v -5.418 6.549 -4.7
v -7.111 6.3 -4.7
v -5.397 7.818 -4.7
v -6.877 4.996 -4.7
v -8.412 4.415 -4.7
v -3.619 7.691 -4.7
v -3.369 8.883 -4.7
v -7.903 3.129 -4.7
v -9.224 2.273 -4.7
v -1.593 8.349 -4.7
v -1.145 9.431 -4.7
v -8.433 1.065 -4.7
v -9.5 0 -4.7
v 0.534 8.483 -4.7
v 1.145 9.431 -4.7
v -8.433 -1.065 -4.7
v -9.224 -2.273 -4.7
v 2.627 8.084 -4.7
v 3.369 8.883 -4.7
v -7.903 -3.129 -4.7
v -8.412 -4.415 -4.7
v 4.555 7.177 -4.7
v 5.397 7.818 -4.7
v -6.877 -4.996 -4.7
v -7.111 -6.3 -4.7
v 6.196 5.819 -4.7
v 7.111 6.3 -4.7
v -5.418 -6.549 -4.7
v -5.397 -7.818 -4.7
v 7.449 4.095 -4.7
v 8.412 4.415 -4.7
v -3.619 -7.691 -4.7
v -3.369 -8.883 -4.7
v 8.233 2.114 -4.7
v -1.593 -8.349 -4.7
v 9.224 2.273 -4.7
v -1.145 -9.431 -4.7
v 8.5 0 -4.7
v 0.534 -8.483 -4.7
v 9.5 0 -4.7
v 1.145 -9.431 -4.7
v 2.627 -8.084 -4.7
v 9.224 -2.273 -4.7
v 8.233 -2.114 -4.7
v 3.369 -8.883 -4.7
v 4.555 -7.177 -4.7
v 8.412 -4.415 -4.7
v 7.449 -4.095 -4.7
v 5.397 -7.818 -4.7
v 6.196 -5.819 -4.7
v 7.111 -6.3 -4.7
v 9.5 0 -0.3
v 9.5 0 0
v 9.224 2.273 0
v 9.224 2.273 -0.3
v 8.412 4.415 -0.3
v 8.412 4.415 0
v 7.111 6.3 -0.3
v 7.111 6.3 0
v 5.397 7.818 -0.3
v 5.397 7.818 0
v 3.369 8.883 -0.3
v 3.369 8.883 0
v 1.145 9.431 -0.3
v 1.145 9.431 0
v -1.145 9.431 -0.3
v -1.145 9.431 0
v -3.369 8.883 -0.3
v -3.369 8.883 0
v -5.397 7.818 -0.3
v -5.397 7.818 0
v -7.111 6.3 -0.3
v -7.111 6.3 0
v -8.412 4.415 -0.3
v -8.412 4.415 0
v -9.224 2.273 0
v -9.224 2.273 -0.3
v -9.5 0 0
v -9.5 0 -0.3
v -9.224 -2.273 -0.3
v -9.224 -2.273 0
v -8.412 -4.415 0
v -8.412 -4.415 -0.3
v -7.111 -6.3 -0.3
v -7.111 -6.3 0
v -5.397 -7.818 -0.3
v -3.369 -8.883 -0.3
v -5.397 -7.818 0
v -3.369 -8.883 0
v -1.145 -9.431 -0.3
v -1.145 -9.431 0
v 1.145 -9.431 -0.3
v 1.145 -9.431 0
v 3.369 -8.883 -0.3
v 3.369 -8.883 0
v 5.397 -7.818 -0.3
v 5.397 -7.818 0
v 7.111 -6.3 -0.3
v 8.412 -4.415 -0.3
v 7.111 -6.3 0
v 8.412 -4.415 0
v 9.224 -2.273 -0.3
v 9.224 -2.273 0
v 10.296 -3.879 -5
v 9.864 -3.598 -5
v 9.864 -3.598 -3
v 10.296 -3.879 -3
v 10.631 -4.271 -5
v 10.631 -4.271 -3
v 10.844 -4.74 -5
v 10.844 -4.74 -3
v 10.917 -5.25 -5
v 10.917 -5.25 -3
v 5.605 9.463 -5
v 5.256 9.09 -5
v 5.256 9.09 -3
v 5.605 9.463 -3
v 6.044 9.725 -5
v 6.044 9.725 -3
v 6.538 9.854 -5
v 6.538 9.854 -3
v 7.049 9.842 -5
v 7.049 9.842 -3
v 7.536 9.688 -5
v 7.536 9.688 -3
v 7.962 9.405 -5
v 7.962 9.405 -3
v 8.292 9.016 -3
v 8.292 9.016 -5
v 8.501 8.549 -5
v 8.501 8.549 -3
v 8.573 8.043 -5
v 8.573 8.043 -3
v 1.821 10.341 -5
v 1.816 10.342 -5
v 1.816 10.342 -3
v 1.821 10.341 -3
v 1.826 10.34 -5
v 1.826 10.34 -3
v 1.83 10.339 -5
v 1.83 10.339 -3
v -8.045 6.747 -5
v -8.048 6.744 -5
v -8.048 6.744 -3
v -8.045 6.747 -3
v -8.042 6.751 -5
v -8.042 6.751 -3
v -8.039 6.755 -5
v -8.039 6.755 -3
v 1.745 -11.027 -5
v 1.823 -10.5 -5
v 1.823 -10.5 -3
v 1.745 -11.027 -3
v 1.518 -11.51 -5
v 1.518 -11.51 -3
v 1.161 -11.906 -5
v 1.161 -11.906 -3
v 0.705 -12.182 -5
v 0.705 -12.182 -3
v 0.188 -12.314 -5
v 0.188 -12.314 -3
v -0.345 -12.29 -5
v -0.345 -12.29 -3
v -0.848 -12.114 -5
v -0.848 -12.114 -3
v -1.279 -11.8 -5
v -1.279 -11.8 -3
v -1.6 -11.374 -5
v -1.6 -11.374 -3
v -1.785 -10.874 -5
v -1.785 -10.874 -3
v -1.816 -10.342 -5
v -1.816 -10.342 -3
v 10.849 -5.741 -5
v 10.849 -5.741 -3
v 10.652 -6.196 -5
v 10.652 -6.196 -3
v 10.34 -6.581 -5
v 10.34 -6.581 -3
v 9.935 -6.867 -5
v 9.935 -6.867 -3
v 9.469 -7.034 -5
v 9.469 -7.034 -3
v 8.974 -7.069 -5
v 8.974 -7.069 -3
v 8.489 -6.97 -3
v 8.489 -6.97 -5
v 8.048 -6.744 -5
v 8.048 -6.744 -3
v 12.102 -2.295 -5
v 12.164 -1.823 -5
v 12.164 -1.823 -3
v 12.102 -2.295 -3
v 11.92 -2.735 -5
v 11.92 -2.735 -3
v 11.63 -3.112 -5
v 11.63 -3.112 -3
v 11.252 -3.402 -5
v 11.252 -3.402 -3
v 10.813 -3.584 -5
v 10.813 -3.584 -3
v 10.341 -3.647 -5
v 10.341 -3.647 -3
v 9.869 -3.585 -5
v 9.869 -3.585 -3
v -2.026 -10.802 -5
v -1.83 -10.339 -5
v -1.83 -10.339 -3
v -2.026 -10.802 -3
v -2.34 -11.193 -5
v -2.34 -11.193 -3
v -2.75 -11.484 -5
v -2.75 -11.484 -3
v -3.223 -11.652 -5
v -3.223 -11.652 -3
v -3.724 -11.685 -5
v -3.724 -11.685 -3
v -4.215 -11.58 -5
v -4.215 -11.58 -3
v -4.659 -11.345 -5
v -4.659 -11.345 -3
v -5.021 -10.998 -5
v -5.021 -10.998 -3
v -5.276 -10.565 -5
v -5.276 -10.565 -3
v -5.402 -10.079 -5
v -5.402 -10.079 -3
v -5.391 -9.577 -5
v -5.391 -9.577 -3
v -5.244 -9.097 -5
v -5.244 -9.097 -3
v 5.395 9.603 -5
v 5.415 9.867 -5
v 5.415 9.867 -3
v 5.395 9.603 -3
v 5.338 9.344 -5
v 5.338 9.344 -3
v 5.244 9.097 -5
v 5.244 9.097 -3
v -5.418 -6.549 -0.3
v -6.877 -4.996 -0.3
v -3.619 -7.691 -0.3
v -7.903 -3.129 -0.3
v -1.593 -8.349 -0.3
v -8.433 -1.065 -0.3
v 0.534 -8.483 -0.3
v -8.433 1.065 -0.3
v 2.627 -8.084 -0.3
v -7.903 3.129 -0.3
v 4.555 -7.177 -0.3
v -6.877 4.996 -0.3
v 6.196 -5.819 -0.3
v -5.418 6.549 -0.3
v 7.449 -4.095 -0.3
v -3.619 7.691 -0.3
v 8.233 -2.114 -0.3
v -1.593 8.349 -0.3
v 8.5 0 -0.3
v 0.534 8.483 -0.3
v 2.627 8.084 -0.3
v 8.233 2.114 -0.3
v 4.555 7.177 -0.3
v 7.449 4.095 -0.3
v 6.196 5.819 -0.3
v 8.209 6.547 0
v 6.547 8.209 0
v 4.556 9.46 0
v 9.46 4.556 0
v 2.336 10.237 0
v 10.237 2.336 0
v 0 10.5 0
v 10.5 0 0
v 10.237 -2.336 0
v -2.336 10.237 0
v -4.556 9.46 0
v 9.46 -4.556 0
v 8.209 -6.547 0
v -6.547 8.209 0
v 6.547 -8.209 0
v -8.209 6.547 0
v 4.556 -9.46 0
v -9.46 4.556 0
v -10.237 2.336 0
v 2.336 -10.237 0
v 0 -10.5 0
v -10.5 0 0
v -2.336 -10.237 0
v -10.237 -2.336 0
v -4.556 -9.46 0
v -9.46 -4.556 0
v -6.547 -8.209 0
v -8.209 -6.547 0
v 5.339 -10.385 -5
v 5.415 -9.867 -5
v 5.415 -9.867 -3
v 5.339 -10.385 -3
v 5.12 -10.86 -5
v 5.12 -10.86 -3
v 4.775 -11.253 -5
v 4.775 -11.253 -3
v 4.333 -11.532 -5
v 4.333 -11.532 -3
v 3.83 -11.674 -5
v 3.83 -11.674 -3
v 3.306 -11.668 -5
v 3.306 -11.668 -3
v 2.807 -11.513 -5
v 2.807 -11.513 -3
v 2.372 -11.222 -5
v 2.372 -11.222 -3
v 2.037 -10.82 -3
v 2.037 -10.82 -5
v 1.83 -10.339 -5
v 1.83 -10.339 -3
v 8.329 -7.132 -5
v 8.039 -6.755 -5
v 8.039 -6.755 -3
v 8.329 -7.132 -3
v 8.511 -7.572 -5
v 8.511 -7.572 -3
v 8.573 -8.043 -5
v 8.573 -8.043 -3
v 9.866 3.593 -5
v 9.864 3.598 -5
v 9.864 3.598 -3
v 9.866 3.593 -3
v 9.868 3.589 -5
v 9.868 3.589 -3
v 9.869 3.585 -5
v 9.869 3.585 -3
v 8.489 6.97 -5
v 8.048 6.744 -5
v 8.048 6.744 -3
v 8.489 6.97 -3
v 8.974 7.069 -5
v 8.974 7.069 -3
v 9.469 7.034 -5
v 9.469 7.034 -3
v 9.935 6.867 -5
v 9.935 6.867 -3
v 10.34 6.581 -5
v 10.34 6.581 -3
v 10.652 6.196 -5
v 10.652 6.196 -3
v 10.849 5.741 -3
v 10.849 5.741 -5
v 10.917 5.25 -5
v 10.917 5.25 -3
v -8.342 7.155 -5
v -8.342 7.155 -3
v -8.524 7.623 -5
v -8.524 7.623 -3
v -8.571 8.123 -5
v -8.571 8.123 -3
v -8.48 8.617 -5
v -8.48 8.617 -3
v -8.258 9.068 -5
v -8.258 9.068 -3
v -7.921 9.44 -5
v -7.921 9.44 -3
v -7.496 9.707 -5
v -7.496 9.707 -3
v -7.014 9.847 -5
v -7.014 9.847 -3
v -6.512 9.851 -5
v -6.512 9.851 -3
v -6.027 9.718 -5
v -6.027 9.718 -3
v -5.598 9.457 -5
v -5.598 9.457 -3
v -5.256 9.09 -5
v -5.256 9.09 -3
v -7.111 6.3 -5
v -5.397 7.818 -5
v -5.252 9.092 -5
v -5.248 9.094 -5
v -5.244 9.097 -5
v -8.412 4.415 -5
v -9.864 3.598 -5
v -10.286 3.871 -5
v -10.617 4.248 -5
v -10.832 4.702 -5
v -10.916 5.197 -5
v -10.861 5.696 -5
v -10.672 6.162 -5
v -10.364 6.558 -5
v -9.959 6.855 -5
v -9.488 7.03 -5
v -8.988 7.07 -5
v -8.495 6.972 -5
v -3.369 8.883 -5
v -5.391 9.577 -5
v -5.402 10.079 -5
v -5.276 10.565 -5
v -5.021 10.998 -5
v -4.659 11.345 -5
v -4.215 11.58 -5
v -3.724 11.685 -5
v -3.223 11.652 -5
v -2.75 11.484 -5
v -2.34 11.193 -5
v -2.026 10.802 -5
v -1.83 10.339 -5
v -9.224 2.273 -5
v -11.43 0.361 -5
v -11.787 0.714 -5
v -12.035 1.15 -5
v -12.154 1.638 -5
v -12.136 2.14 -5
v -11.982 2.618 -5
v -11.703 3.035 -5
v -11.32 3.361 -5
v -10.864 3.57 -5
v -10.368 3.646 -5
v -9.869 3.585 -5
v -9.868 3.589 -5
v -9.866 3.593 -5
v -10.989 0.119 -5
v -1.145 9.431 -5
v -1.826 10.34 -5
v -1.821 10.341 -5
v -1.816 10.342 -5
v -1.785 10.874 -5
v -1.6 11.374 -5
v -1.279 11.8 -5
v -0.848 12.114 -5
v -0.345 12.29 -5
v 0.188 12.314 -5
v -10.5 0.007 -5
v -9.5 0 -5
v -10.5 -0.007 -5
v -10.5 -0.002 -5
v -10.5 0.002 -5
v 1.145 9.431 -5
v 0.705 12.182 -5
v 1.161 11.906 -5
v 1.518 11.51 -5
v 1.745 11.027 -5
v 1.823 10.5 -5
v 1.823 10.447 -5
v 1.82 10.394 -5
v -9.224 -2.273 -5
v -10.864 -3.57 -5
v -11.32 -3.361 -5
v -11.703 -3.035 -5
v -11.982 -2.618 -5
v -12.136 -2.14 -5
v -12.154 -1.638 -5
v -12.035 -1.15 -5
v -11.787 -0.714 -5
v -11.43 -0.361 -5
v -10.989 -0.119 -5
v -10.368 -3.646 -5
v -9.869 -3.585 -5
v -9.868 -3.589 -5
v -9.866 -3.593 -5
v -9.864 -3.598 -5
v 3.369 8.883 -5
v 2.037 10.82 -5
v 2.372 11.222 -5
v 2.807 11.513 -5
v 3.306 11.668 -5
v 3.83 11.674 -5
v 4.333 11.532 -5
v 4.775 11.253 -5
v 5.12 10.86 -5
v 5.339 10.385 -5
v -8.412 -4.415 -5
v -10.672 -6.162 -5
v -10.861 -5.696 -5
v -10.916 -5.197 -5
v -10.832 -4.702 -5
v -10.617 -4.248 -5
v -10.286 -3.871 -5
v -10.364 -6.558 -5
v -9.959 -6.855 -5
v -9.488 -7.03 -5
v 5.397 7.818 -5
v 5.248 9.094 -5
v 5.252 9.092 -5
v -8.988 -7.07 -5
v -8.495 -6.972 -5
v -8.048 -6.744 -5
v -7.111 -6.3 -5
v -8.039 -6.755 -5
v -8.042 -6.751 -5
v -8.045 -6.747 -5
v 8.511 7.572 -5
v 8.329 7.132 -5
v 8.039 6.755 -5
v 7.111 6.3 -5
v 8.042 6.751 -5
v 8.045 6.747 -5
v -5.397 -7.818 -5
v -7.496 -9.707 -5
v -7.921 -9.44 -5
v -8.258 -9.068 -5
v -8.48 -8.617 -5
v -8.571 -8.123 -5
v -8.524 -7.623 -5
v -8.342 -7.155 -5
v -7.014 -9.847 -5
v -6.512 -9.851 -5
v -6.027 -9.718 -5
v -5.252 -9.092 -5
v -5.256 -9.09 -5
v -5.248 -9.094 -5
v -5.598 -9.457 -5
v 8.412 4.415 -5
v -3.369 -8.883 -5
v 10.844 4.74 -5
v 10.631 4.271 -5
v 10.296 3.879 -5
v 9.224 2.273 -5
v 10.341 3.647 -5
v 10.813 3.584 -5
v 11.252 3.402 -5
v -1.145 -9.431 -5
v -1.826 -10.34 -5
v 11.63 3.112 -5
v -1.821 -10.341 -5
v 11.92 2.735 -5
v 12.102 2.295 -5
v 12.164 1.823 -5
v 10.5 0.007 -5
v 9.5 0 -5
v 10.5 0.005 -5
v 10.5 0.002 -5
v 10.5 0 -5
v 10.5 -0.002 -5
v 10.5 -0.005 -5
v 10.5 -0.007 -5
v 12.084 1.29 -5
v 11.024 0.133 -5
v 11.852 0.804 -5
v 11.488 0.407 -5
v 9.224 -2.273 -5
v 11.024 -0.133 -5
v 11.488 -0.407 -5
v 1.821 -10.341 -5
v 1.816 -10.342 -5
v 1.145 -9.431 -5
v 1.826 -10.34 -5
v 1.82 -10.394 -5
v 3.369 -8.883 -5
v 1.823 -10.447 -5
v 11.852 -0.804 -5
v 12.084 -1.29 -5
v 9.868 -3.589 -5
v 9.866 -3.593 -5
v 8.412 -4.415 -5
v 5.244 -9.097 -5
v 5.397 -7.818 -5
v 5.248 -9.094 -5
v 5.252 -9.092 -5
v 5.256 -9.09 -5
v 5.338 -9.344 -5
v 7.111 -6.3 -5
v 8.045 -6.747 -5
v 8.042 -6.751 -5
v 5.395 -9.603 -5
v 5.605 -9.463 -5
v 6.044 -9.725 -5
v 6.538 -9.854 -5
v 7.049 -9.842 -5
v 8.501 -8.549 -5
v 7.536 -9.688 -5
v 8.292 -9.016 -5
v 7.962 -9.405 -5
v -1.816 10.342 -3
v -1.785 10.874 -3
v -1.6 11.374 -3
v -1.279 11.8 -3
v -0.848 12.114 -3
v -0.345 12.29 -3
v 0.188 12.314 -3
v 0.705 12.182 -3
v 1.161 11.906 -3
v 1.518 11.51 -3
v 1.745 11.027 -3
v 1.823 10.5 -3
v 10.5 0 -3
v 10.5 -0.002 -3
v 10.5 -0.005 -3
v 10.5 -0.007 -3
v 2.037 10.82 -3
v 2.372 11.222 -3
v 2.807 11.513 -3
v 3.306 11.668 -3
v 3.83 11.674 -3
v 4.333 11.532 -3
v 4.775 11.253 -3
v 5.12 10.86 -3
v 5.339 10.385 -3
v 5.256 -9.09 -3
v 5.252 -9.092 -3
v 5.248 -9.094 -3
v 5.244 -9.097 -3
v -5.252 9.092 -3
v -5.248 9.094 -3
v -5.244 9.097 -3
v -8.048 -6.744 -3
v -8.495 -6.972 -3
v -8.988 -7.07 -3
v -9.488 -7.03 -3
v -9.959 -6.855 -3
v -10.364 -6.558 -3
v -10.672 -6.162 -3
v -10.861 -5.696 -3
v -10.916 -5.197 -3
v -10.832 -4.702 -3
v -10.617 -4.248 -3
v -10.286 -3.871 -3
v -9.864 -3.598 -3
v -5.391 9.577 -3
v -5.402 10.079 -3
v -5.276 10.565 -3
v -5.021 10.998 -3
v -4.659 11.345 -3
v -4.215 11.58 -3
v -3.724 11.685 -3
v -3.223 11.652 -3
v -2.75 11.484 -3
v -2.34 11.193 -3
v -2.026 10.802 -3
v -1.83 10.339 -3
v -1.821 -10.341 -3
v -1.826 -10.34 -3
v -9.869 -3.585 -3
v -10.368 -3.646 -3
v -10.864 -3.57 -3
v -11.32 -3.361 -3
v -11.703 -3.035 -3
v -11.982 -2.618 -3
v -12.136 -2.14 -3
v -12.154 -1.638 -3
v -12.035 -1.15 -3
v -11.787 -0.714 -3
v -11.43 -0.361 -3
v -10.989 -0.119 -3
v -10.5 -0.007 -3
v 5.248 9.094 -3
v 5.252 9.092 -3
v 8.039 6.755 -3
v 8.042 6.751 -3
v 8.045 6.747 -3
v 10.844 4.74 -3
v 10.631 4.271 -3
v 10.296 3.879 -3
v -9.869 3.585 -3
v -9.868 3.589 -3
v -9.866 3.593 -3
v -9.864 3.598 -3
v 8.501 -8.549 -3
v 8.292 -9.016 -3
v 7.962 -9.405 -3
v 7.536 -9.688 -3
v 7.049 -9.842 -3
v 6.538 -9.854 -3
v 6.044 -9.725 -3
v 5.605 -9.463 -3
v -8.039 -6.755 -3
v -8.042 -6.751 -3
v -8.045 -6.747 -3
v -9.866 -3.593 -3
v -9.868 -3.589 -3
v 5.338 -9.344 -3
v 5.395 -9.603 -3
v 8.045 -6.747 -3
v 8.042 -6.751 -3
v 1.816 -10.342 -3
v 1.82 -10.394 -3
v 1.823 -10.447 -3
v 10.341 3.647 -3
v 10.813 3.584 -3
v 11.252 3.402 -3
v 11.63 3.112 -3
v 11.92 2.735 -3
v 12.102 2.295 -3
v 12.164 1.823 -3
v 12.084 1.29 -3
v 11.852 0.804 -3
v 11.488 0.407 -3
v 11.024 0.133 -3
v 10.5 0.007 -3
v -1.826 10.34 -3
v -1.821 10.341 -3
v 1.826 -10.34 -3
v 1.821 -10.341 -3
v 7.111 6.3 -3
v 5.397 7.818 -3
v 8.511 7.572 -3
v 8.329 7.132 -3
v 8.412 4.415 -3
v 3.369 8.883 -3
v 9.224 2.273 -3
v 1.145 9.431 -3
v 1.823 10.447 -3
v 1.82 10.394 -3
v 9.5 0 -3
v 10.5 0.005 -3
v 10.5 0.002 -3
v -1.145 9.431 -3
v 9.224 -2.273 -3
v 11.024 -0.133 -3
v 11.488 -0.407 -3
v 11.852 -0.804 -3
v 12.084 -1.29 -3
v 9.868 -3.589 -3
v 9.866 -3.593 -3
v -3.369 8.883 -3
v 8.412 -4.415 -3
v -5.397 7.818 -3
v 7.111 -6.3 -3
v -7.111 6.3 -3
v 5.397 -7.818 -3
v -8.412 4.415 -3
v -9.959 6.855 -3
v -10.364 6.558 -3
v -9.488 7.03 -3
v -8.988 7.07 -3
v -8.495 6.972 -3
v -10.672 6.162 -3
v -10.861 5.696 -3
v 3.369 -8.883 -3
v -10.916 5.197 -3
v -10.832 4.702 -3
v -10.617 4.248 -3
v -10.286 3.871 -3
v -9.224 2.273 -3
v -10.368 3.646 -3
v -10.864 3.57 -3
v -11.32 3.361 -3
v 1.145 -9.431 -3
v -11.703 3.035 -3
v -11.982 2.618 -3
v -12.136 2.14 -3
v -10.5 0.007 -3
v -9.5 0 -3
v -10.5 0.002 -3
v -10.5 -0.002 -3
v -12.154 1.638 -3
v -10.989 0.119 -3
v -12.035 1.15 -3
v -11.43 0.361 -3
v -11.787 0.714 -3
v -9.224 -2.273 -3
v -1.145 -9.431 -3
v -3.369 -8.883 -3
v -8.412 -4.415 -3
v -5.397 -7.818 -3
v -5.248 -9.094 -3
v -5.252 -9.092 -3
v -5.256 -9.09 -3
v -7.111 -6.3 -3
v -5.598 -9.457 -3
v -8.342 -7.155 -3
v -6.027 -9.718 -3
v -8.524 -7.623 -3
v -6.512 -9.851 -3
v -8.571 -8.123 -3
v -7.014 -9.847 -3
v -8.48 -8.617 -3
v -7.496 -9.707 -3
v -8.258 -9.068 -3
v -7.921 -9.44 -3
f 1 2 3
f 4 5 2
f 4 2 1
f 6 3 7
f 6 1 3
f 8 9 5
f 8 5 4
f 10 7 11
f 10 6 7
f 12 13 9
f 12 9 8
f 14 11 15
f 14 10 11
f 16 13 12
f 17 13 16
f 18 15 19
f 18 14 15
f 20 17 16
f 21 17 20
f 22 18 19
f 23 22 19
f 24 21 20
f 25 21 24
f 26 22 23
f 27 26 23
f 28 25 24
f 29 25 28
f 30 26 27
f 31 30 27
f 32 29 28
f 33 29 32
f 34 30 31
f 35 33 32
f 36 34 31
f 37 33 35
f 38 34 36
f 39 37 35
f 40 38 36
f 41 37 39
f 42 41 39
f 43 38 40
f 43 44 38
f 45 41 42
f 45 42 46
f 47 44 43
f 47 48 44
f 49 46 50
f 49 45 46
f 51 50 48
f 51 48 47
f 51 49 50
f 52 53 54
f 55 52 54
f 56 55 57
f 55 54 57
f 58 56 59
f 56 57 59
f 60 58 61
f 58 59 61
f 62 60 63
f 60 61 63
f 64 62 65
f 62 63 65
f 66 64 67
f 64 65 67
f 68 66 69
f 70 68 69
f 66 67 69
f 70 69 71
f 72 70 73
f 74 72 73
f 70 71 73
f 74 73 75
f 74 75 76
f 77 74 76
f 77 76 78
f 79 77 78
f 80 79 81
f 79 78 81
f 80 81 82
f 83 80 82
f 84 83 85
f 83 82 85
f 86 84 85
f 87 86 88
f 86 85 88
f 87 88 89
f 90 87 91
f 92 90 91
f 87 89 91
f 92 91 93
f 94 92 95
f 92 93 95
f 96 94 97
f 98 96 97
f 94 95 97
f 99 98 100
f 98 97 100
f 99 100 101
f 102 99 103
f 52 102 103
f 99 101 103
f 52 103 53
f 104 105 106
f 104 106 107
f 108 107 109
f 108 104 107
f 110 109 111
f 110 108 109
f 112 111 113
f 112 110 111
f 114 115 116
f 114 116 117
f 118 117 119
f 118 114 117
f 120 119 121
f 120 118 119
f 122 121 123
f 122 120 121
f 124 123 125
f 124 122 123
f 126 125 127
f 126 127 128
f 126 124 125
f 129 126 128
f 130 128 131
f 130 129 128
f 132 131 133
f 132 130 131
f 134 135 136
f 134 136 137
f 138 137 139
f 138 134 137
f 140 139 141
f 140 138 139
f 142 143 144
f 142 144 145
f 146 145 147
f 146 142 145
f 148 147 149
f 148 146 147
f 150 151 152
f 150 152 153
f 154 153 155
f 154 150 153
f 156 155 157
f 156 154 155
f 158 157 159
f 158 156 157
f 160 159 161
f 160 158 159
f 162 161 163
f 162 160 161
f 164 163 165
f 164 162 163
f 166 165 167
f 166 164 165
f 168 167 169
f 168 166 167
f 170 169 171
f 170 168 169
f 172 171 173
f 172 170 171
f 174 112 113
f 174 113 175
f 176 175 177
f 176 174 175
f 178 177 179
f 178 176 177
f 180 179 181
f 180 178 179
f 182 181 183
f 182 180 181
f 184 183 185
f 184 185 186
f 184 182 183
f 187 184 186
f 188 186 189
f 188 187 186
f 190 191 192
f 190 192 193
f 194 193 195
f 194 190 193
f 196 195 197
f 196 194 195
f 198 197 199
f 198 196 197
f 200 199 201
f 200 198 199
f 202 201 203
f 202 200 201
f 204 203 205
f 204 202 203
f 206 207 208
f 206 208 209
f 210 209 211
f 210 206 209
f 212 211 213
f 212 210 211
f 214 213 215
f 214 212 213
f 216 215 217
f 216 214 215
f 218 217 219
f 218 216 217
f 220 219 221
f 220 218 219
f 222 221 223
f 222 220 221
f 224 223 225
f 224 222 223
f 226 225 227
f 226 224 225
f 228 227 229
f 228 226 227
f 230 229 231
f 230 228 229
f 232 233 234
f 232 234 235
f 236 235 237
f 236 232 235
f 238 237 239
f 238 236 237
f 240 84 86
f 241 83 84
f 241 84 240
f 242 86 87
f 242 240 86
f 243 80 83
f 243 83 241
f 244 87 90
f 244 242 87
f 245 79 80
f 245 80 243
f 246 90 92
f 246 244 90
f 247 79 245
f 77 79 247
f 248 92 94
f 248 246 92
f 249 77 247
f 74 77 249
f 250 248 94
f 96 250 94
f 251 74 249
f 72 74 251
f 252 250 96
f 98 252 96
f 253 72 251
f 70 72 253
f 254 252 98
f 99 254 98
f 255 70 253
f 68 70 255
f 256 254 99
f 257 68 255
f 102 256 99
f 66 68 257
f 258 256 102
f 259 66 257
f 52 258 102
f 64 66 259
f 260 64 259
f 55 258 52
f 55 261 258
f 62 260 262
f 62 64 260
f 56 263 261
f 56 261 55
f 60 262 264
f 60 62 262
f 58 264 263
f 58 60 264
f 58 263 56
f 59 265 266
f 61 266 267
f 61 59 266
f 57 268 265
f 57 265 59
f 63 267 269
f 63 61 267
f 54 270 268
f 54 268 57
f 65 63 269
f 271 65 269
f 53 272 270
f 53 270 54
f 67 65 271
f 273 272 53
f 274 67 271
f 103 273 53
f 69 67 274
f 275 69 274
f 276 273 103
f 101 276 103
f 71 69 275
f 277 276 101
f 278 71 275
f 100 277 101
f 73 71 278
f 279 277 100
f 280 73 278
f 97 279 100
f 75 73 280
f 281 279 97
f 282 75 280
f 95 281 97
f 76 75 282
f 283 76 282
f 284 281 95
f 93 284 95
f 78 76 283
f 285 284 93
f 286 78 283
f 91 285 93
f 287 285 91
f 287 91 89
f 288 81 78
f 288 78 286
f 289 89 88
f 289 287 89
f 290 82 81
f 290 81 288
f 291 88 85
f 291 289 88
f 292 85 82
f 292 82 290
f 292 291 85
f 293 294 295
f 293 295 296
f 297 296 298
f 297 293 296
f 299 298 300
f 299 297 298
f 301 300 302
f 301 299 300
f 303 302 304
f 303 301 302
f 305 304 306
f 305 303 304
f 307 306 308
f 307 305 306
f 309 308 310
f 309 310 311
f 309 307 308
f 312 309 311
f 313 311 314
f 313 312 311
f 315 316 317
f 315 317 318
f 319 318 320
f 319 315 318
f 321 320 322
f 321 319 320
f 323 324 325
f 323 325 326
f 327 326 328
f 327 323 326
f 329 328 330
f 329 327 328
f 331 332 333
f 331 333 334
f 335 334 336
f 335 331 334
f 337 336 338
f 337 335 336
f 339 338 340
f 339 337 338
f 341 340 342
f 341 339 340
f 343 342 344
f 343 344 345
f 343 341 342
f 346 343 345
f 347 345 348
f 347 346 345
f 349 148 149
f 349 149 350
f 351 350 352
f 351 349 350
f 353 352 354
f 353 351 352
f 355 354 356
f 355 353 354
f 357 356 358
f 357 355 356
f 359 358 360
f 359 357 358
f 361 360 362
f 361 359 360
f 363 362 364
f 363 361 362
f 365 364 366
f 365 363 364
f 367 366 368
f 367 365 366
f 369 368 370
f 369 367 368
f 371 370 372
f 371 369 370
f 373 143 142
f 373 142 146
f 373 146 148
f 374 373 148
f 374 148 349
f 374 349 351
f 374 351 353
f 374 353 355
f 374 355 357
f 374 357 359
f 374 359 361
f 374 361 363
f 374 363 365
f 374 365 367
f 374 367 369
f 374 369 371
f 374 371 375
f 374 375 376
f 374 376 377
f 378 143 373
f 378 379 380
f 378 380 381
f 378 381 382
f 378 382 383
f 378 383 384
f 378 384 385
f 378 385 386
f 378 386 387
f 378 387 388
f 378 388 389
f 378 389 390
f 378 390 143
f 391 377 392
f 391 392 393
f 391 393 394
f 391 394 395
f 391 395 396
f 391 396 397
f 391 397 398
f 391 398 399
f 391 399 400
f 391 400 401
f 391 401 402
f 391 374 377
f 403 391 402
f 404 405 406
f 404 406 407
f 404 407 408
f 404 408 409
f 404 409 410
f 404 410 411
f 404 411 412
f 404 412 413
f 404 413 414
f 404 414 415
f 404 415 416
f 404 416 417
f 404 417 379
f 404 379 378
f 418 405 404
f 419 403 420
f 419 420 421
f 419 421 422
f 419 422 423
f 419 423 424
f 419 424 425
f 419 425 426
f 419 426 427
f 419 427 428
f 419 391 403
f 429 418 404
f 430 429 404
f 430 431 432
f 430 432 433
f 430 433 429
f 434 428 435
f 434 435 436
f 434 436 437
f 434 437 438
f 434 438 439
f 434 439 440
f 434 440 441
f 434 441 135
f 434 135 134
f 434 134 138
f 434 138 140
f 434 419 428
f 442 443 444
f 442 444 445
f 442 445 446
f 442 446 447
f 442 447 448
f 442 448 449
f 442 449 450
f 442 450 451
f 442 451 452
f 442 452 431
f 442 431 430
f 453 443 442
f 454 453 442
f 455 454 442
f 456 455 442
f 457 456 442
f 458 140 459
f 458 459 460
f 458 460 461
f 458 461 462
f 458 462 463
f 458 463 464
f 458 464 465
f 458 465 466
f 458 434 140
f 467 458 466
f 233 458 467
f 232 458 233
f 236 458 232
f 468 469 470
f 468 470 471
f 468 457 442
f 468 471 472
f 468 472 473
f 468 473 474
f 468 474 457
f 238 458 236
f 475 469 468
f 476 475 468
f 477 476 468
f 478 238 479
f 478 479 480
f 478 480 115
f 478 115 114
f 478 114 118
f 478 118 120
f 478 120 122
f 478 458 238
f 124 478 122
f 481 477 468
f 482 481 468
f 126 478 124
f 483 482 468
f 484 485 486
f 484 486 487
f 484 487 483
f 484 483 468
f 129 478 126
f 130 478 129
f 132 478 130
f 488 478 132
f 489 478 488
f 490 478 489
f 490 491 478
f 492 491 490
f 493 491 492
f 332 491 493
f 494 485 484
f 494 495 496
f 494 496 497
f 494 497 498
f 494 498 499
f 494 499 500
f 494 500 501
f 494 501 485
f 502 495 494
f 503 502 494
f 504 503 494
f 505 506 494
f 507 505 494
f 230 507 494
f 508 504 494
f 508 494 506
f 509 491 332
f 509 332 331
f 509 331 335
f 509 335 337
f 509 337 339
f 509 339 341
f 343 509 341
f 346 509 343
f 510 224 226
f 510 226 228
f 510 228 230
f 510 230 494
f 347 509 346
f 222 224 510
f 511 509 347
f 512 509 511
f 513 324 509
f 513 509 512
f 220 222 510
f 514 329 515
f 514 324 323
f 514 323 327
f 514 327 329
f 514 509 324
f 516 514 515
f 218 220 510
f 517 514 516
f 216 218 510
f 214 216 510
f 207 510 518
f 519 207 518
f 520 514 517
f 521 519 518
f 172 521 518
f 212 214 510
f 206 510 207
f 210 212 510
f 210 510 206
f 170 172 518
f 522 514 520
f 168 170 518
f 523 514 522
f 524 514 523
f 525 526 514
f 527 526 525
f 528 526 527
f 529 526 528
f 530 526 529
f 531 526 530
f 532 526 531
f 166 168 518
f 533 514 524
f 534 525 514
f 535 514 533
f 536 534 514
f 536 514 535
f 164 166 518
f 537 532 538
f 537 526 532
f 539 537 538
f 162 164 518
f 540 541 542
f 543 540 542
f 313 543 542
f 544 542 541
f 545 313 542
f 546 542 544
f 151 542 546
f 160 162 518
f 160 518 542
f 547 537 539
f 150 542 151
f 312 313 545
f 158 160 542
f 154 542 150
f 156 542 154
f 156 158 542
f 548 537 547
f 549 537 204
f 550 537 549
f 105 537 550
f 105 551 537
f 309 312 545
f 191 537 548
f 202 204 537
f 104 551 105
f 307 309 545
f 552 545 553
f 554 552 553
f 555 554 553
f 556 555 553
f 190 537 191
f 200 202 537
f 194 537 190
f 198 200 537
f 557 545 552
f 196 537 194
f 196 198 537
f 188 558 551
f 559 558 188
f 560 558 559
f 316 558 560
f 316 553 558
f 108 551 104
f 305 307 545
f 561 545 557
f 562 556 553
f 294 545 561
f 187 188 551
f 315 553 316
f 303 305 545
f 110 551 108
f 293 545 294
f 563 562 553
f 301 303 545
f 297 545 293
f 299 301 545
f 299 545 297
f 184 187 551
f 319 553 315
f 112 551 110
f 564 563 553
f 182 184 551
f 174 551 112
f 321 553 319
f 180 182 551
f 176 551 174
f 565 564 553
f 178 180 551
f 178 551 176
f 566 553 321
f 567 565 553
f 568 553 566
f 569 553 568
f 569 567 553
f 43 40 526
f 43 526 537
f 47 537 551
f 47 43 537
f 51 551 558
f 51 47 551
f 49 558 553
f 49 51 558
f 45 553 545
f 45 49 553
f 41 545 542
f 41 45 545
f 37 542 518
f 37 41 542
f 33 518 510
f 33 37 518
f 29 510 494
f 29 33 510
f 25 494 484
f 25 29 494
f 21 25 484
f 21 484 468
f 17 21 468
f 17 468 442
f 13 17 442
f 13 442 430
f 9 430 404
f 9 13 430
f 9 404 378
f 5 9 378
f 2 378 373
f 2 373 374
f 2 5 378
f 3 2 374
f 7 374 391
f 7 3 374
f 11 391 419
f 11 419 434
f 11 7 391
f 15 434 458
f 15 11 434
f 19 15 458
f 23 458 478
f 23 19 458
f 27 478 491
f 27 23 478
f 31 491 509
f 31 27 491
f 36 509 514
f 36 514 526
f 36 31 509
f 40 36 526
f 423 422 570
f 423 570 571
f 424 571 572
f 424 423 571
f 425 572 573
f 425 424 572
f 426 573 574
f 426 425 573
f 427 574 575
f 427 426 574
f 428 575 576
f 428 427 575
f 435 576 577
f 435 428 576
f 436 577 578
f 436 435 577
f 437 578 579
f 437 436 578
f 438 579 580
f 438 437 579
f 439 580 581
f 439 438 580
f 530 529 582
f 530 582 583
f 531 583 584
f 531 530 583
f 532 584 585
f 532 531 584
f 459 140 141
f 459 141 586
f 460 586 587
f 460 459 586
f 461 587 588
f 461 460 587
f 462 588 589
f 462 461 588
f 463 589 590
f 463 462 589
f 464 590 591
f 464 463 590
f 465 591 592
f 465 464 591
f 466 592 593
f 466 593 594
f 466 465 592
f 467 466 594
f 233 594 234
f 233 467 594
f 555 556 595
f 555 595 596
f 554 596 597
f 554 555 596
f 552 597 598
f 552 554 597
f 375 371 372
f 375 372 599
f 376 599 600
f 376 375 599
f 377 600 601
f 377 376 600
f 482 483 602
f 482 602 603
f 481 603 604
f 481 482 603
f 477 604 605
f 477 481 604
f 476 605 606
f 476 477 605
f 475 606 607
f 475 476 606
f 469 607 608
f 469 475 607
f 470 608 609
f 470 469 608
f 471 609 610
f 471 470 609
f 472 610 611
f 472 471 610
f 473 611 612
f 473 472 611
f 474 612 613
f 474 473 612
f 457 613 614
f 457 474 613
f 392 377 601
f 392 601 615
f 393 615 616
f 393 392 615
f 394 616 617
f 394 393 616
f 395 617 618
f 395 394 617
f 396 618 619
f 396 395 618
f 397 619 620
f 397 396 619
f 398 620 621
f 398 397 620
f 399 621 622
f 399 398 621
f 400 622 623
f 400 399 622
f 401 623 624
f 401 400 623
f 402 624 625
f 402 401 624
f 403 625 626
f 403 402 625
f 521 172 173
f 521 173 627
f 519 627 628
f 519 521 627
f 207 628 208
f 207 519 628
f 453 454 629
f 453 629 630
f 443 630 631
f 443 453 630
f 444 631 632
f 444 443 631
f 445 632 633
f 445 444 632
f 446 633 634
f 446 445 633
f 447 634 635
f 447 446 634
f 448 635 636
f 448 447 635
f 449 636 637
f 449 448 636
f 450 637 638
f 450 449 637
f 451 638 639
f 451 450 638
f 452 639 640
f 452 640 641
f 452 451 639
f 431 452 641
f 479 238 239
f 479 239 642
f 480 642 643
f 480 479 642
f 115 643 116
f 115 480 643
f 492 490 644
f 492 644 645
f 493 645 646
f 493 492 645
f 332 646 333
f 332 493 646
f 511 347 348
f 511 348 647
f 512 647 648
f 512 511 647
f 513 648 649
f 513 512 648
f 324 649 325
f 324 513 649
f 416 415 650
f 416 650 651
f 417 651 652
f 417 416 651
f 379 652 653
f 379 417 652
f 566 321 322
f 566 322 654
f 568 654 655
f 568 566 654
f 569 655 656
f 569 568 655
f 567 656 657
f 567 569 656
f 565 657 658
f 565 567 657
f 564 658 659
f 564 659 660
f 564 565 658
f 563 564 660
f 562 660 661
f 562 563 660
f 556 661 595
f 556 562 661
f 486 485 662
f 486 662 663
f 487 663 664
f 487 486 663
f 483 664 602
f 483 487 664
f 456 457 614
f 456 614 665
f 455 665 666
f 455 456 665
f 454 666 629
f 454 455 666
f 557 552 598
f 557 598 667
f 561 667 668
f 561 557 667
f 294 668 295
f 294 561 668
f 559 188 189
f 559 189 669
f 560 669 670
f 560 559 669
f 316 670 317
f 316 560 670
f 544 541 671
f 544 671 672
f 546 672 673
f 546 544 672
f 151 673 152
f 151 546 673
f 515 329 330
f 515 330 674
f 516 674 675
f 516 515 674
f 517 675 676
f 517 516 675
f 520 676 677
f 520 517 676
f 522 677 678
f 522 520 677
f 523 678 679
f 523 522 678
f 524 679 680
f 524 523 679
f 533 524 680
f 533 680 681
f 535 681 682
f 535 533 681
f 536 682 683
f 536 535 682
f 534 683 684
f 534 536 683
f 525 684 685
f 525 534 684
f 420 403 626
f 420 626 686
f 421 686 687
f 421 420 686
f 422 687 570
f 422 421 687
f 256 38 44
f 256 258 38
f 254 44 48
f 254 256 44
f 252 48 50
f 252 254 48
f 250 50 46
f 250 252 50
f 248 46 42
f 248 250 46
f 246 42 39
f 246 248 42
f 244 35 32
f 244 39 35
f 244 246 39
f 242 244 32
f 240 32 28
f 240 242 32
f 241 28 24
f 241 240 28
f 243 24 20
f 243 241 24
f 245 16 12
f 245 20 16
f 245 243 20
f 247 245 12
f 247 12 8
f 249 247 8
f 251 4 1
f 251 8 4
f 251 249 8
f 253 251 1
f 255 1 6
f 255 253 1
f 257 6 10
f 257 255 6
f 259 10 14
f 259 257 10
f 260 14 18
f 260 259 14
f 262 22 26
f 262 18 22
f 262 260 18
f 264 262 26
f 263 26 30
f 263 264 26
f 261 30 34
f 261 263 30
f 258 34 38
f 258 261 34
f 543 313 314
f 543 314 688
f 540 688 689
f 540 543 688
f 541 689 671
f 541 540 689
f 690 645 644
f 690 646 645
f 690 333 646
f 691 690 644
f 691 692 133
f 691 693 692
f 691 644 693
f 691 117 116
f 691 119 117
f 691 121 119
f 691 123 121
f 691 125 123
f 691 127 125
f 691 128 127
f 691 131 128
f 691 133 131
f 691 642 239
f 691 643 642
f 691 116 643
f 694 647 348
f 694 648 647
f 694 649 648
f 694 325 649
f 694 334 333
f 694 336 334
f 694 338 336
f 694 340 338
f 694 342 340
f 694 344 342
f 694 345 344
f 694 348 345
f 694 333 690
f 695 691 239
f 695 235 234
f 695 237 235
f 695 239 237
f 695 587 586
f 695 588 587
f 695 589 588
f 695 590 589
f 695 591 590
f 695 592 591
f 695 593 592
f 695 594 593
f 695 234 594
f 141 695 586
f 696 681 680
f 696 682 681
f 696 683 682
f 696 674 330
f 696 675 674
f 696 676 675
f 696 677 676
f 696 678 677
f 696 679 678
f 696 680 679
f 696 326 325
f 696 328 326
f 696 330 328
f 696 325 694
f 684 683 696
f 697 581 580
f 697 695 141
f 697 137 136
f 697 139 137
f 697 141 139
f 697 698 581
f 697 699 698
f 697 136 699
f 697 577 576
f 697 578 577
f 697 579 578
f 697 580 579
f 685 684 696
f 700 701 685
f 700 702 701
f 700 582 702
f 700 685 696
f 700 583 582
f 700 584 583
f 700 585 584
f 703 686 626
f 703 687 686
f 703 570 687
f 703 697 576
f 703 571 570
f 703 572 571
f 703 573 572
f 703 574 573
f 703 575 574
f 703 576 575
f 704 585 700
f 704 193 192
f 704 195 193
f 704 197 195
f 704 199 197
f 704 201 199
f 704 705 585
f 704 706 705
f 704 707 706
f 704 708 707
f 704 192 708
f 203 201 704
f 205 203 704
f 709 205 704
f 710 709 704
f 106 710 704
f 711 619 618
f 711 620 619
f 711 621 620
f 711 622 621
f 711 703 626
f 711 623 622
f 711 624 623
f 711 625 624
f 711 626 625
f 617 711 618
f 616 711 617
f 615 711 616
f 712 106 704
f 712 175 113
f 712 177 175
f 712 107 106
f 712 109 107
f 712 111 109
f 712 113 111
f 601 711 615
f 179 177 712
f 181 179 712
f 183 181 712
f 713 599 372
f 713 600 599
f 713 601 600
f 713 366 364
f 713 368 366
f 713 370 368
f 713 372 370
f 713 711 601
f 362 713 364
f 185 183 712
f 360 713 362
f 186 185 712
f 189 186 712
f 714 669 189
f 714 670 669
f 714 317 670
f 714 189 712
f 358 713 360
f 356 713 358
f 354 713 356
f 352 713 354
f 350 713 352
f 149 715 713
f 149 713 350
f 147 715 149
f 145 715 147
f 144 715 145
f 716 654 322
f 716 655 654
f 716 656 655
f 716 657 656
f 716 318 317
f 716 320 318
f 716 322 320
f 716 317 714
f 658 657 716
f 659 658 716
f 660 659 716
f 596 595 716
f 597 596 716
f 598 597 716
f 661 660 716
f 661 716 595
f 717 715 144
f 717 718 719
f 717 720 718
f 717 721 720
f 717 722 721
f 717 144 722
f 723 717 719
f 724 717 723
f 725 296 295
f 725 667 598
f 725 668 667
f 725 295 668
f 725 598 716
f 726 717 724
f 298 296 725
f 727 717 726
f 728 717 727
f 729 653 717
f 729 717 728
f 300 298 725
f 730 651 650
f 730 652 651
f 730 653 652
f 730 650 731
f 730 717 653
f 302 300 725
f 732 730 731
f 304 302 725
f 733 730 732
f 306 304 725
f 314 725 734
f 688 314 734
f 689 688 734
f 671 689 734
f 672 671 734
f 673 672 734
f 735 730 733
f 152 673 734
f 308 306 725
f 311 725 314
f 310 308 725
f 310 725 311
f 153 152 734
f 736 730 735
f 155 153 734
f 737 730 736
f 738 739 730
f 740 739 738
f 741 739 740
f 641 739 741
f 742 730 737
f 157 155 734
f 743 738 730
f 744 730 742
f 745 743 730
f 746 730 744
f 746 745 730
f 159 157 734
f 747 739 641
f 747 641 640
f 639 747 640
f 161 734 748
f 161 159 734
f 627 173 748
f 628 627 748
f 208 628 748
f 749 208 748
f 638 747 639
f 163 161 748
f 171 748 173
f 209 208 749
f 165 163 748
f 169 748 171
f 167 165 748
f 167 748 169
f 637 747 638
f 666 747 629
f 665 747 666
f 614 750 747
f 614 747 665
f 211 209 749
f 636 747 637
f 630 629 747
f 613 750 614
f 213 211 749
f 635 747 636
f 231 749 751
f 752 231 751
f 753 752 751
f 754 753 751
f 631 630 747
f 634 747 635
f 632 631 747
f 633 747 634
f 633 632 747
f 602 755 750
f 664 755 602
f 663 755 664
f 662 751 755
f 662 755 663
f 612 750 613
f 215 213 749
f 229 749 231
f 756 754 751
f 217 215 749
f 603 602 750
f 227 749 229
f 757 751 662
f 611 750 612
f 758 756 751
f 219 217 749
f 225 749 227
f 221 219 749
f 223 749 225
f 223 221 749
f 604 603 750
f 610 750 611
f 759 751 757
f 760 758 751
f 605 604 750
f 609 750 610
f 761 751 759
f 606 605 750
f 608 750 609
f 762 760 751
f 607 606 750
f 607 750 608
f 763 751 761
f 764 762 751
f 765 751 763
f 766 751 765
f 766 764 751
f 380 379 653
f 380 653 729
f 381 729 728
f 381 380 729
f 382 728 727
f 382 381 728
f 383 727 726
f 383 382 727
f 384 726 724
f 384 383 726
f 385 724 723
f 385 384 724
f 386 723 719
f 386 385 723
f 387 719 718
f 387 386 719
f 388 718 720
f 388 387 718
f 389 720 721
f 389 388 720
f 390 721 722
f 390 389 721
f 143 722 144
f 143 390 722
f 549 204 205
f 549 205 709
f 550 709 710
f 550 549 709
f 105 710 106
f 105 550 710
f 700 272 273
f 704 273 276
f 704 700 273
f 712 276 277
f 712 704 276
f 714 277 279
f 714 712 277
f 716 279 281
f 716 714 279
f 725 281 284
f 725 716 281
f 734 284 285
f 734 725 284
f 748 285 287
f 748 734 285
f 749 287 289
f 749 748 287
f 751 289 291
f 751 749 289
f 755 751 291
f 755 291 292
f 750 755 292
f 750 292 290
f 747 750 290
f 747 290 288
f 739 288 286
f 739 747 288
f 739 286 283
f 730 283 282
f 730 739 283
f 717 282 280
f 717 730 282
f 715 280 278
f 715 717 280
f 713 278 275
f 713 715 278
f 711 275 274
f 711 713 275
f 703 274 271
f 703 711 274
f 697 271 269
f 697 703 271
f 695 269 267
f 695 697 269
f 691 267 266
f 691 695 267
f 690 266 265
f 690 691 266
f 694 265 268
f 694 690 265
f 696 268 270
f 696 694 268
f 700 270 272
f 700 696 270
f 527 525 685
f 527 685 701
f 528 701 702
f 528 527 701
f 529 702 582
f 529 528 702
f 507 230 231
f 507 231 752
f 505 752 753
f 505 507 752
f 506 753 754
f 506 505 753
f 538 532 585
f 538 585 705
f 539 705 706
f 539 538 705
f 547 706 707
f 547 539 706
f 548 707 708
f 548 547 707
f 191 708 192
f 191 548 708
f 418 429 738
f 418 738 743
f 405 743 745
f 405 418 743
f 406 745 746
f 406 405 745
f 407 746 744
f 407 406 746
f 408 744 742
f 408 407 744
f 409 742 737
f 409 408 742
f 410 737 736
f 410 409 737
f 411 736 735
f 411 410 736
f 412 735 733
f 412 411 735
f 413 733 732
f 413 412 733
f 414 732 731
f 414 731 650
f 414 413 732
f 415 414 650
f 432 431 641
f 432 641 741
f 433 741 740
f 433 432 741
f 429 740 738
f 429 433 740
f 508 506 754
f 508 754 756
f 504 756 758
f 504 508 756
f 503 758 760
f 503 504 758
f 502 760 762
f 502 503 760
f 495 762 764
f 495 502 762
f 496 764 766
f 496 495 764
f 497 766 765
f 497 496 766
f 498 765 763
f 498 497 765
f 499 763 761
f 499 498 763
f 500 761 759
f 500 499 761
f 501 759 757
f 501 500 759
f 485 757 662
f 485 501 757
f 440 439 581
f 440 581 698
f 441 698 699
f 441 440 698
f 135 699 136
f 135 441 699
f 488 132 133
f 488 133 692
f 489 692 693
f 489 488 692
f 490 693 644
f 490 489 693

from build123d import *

# Parameters (mm, degrees)
CUT_EXTRUDE_START   = -2
SKETCH_2_R          = 13.5
CUT_EXTRUDE_3_DEPTH = 2
SKETCH_3_R          = 9.5
CUT_EXTRUDE_4_DEPTH = 0.3
CUT_EXTRUDE_START_2 = -0.3
SKETCH_4_R          = 9.5
CUT_EXTRUDE_5_DEPTH = 0.3


with BuildPart() as part:
    # 草图1 → 旋转1 (revolve)
    with BuildSketch(Plane(origin=(0, 0, 0), x_dir=(0, 0, -1), z_dir=(1, 0, 0)), mode=Mode.PRIVATE) as revolve_1_sk:
        Polygon((0, 8.5), (0, 10.5), (3, 9.5), (3, 13.5), (5, 13.5), (5, 8.5), align=None)
    revolve(revolve_1_sk.sketch.rotate(Axis((0, 0, 0), (0, 0, -1)), 90), axis=Axis((0, 0, 0), (0, 0, -1)))

    # 草图2 → 切除-拉伸3 (cut)
    with BuildSketch(Plane.XY.offset(-3).offset(CUT_EXTRUDE_START)):
        Circle(SKETCH_2_R)
        with BuildLine():
            ThreePointArc((10.499997673, 0.006991234), (10.499999418, 0.003495617), (10.5, 0))
            ThreePointArc((10.5, 0), (10.499999418, -0.003495617), (10.499997673, -0.006991234))
            ThreePointArc((10.499997673, -0.006991234), (11.684968525, -0.591722061), (12.163787272, -1.823305866))
            ThreePointArc((12.163787272, -1.823305866), (11.450680461, -3.269646883), (9.869161474, -3.584641098))
            ThreePointArc((9.869161474, -3.584641098), (9.866772518, -3.591211505), (9.864379188, -3.59778032))
            ThreePointArc((9.864379188, -3.59778032), (10.631190361, -4.270594459), (10.916572605, -5.25))
            ThreePointArc((10.916572605, -5.25), (9.935444894, -6.86715189), (8.047958748, -6.74391281))
            ThreePointArc((8.047958748, -6.74391281), (8.043466653, -6.749269902), (8.038970991, -6.754624002))
            ThreePointArc((8.038970991, -6.754624002), (8.433900995, -7.345998116), (8.572575767, -8.043466653))
            ThreePointArc((8.572575767, -8.043466653), (7.297837999, -9.782293074), (5.256053423, -9.089769107))
            ThreePointArc((5.256053423, -9.089769107), (5.25, -9.09326674), (5.24394425, -9.096760341))
            ThreePointArc((5.24394425, -9.096760341), (5.371363407, -9.472433216), (5.41451737, -9.866772518))
            ThreePointArc((5.41451737, -9.866772518), (3.829501581, -11.674440109), (1.830190483, -10.339265099))
            ThreePointArc((1.830190483, -10.339265099), (1.823305866, -10.340481407), (1.81642044, -10.34169313))
            ThreePointArc((1.81642044, -10.34169313), (1.821583696, -10.420771731), (1.823305866, -10.5))
            ThreePointArc((1.823305866, -10.5), (-0.079228269, -12.321583696), (-1.81642044, -10.34169313))
            ThreePointArc((-1.81642044, -10.34169313), (-1.823305866, -10.340481407), (-1.830190483, -10.339265099))
            ThreePointArc((-1.830190483, -10.339265099), (-4.214818838, -11.580119586), (-5.24394425, -9.096760341))
            ThreePointArc((-5.24394425, -9.096760341), (-5.25, -9.09326674), (-5.256053423, -9.089769107))
            ThreePointArc((-5.256053423, -9.089769107), (-7.921268321, -9.440199979), (-8.038970991, -6.754624002))
            ThreePointArc((-8.038970991, -6.754624002), (-8.043466653, -6.749269902), (-8.047958748, -6.74391281))
            ThreePointArc((-8.047958748, -6.74391281), (-10.672295938, -6.161652933), (-9.864379188, -3.59778032))
            ThreePointArc((-9.864379188, -3.59778032), (-9.866772518, -3.591211505), (-9.869161474, -3.584641098))
            ThreePointArc((-9.869161474, -3.584641098), (-12.136087159, -2.139919606), (-10.499997673, -0.006991234))
            ThreePointArc((-10.499997673, -0.006991234), (-10.5, 0), (-10.499997673, 0.006991234))
            ThreePointArc((-10.499997673, 0.006991234), (-12.136087159, 2.139919606), (-9.869161474, 3.584641098))
            ThreePointArc((-9.869161474, 3.584641098), (-9.866772518, 3.591211505), (-9.864379188, 3.59778032))
            ThreePointArc((-9.864379188, 3.59778032), (-10.672295938, 6.161652933), (-8.047958748, 6.74391281))
            ThreePointArc((-8.047958748, 6.74391281), (-8.043466653, 6.749269902), (-8.038970991, 6.754624002))
            ThreePointArc((-8.038970991, 6.754624002), (-7.921268321, 9.440199979), (-5.256053423, 9.089769107))
            ThreePointArc((-5.256053423, 9.089769107), (-5.25, 9.09326674), (-5.24394425, 9.096760341))
            ThreePointArc((-5.24394425, 9.096760341), (-4.214818838, 11.580119586), (-1.830190483, 10.339265099))
            ThreePointArc((-1.830190483, 10.339265099), (-1.823305866, 10.340481407), (-1.81642044, 10.34169313))
            ThreePointArc((-1.81642044, 10.34169313), (-0.079228269, 12.321583696), (1.823305866, 10.5))
            ThreePointArc((1.823305866, 10.5), (1.821583696, 10.420771731), (1.81642044, 10.34169313))
            ThreePointArc((1.81642044, 10.34169313), (1.823305866, 10.340481407), (1.830190483, 10.339265099))
            ThreePointArc((1.830190483, 10.339265099), (3.829501581, 11.674440109), (5.41451737, 9.866772518))
            ThreePointArc((5.41451737, 9.866772518), (5.371363407, 9.472433216), (5.24394425, 9.096760341))
            ThreePointArc((5.24394425, 9.096760341), (5.25, 9.09326674), (5.256053423, 9.089769107))
            ThreePointArc((5.256053423, 9.089769107), (7.297837999, 9.782293074), (8.572575767, 8.043466653))
            ThreePointArc((8.572575767, 8.043466653), (8.433900995, 7.345998116), (8.038970991, 6.754624002))
            ThreePointArc((8.038970991, 6.754624002), (8.043466653, 6.749269902), (8.047958748, 6.74391281))
            ThreePointArc((8.047958748, 6.74391281), (9.935444894, 6.86715189), (10.916572605, 5.25))
            ThreePointArc((10.916572605, 5.25), (10.631190361, 4.270594459), (9.864379188, 3.59778032))
            ThreePointArc((9.864379188, 3.59778032), (9.866772518, 3.591211505), (9.869161474, 3.584641098))
            ThreePointArc((9.869161474, 3.584641098), (11.450680461, 3.269646883), (12.163787272, 1.823305866))
            ThreePointArc((12.163787272, 1.823305866), (11.684968525, 0.591722061), (10.499997673, 0.006991234))
        make_face(mode=Mode.SUBTRACT)
    extrude(amount=CUT_EXTRUDE_3_DEPTH, mode=Mode.SUBTRACT)

    # 草图3 → 切除-拉伸4 (cut)
    with BuildSketch(Plane.XY):
        Circle(SKETCH_3_R)
    extrude(amount=-CUT_EXTRUDE_4_DEPTH, mode=Mode.SUBTRACT)

    # 草图4 → 切除-拉伸5 (cut)
    with BuildSketch(Plane(origin=(0, 0, -5), x_dir=(-1, 0, 0), z_dir=(0, 0, -1)).offset(CUT_EXTRUDE_START_2)):
        with Locations(Location((0, 0, 0), (0, 0, 180))):
            Circle(SKETCH_4_R)
    extrude(amount=CUT_EXTRUDE_5_DEPTH, mode=Mode.SUBTRACT)


solid = part.part
